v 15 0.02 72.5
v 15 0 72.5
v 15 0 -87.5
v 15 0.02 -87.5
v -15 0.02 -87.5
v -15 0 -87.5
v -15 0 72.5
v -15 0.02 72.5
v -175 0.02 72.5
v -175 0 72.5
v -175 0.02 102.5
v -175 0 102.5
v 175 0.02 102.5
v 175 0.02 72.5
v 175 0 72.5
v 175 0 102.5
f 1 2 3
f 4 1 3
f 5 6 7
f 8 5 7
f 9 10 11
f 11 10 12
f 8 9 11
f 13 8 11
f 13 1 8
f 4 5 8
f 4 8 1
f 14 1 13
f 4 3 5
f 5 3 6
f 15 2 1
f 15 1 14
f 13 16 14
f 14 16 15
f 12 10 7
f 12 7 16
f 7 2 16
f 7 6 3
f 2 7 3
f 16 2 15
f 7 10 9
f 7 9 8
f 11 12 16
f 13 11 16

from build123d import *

# Parameters (mm, degrees)
BOSS_EXTRUDE3_DEPTH = 0.02


with BuildPart() as part:
    # Sketch3 → Boss-Extrude3 (new body)
    with BuildSketch(Plane(origin=(0, 0, 0), x_dir=(1, 0, 0), z_dir=(0, 1, 0))):
        Polygon((175, -102.5), (175, -72.5), (15, -72.5), (15, 87.5), (-15, 87.5), (-15, -72.5), (-175, -72.5), (-175, -102.5), align=None)
    extrude(amount=BOSS_EXTRUDE3_DEPTH)


solid = part.part
